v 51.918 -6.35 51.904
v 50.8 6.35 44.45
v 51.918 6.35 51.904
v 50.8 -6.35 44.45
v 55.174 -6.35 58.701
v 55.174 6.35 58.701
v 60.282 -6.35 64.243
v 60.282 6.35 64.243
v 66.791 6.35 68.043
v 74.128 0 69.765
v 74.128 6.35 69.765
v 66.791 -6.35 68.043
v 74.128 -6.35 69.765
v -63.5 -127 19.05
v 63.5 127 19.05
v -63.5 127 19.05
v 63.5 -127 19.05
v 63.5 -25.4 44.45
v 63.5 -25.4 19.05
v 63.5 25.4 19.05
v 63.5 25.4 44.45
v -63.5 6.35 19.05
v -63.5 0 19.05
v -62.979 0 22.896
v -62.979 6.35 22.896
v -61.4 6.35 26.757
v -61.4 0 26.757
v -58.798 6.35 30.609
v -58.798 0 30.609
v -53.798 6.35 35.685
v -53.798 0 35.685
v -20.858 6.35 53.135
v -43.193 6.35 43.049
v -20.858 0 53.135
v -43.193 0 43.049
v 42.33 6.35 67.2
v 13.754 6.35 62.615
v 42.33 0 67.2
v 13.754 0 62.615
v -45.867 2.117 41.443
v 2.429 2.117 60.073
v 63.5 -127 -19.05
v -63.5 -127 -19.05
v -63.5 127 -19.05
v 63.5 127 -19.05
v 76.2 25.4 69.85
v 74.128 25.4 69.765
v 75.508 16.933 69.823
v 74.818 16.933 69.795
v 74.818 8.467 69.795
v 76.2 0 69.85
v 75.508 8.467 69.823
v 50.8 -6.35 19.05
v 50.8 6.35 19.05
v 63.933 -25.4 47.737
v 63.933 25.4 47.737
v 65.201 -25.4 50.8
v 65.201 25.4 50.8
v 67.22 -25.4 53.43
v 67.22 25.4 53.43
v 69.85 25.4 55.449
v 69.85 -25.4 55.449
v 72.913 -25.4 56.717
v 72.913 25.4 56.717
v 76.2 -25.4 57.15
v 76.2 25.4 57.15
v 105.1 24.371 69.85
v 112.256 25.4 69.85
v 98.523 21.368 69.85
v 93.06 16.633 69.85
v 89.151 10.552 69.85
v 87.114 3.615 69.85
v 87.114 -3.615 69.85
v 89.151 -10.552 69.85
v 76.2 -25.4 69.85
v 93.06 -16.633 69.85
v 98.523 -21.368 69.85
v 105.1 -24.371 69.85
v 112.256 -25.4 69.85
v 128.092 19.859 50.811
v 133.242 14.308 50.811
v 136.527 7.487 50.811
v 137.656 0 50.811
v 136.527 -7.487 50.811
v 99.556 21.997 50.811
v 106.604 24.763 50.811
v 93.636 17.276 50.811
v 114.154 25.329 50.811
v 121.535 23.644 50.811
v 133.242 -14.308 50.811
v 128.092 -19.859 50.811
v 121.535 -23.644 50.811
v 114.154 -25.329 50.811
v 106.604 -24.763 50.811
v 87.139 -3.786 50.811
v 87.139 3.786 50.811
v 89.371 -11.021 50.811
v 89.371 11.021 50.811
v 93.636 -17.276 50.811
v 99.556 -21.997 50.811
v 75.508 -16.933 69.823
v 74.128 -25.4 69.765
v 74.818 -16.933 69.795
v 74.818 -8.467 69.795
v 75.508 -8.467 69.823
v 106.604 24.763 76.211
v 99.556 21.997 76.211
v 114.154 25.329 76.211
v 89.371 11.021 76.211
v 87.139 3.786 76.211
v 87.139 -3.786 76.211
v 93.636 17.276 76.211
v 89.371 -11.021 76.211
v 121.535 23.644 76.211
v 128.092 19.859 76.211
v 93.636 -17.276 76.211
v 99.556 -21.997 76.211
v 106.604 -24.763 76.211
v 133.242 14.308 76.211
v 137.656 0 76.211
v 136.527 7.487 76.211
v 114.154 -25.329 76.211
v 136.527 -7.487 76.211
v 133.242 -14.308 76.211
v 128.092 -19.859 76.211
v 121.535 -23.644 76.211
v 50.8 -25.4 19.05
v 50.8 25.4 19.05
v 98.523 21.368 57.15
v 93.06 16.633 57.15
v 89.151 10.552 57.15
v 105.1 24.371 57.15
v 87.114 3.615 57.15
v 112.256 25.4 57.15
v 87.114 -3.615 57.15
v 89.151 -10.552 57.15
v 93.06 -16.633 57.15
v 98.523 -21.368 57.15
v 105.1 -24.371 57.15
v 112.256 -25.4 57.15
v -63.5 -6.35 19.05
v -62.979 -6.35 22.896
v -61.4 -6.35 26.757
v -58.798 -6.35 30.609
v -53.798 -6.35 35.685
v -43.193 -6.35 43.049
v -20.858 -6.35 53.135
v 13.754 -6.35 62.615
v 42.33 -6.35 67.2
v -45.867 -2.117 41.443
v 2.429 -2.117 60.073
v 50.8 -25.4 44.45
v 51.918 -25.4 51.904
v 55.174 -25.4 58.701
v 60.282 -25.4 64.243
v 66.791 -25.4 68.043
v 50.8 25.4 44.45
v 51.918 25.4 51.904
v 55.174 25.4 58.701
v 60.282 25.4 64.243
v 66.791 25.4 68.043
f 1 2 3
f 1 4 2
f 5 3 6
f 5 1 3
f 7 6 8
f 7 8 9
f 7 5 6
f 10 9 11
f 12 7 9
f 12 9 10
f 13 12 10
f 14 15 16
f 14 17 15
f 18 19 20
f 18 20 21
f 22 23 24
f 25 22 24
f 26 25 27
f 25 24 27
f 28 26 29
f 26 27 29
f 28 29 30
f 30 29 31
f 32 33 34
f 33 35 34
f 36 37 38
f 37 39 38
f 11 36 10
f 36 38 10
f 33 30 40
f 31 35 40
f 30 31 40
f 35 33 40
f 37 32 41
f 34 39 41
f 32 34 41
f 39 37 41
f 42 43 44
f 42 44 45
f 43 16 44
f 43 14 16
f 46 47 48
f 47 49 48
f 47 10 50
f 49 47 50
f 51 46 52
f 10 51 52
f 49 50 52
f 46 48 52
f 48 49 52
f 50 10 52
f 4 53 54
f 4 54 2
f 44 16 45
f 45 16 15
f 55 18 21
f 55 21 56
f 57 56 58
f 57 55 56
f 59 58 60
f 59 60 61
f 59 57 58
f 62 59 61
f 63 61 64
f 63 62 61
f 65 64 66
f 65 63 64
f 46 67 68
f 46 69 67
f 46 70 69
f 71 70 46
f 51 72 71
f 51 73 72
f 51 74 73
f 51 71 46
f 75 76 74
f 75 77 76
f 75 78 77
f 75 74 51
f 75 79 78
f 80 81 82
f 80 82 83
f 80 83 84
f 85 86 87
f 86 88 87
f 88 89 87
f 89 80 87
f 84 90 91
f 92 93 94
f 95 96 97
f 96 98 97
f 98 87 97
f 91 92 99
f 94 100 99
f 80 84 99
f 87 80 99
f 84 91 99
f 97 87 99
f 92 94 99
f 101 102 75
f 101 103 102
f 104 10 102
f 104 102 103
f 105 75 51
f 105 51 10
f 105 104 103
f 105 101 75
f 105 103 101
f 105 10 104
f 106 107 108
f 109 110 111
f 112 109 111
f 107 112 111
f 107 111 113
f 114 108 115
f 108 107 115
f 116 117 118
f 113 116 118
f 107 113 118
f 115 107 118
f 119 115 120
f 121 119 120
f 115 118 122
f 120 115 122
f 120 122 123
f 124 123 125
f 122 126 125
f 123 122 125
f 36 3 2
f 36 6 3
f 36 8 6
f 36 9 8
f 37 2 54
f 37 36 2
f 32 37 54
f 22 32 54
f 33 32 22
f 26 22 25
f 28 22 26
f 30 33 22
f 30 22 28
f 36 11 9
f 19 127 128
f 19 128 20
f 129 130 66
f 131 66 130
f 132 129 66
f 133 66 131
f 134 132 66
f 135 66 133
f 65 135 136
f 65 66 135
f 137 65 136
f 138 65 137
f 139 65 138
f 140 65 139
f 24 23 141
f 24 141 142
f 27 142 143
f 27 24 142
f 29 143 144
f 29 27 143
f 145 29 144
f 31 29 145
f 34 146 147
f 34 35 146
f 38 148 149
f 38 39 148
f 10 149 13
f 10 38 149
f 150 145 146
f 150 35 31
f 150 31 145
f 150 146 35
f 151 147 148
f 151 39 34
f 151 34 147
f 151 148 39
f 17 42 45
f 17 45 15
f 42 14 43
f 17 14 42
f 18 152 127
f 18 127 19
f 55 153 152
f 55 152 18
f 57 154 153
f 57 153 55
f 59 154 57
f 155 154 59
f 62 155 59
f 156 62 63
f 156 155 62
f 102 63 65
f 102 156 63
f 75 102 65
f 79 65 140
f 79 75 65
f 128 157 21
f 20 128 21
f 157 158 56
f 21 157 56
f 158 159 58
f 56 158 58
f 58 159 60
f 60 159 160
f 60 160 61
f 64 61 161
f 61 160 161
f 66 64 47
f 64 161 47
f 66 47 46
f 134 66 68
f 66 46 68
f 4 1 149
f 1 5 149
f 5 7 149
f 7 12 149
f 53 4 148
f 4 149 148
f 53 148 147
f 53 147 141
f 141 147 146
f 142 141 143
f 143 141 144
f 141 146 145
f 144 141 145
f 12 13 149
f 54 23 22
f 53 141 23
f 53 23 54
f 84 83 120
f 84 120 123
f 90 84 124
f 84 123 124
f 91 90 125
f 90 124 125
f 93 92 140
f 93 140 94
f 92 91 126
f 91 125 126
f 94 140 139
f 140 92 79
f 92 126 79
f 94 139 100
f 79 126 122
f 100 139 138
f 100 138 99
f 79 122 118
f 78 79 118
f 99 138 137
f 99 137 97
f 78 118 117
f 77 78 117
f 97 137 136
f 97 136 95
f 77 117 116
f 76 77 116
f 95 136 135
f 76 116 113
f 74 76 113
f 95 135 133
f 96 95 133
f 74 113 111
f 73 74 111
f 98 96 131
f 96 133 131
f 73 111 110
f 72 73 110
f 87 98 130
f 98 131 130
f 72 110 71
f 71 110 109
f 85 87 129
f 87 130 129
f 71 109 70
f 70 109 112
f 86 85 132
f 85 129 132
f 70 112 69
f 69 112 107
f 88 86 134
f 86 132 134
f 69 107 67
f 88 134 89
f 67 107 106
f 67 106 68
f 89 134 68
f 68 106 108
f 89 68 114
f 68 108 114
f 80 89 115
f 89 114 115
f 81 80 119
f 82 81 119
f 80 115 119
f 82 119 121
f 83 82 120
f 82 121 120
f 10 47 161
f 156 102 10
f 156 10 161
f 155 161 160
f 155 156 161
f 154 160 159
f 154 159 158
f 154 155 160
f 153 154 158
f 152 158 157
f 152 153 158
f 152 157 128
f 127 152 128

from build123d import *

# Parameters (mm, degrees)
F1_DEPTH = 127
F0_W     = 25.4
F0_H     = 12.7
F2_DEPTH = 25.4
F3_DEPTH = 6.35


with BuildPart() as f1:
    # F0 (on Front) → F1 (new body, symmetric)
    with BuildSketch(Plane.XZ):
        Polygon((50.8, 19.05), (-63.5, 19.05), (-63.5, -19.05), (63.5, -19.05), (63.5, 19.05), align=None)
    extrude(amount=F1_DEPTH, both=True)


with BuildPart() as f2:
    # F0 (on Front) → F2 (new body, symmetric)
    with BuildSketch(Plane.XZ):
        with BuildLine():
            Line((50.8, 44.45), (50.8, 19.05))
            Line((50.8, 19.05), (63.5, 19.05))
            Line((63.5, 19.05), (63.5, 44.45))
            ThreePointArc((63.5, 44.45), (67.219744, 53.430256), (76.2, 57.15))
            Line((76.2, 57.15), (86.855575, 57.15))
            Line((86.855575, 57.15), (86.855575, 69.85))
            Line((86.855575, 69.85), (76.2, 69.85))
            add(Edge.make_bspline(
                [(74.128456, 69.765385), (74.817225, 69.795126), (75.507747, 69.823336), (76.2, 69.85)],
                knots=[147.396049, 147.396049, 147.396049, 147.396049, 148.649689, 148.649689, 148.649689, 148.649689], degree=3))
            ThreePointArc((74.128456, 69.765385), (57.52144, 61.662536), (50.8, 44.45))
        make_face()
        with Locations((99.555575, 63.5)):
            Rectangle(F0_W, F0_H)
    extrude(amount=F2_DEPTH, both=True)

    # F0 (on Front) → F4 (revolve)
    with BuildSketch(Plane.XZ):
        Polygon((112.255575, 76.210847), (112.255575, 69.85), (112.255575, 57.15), (112.255575, 50.810847), (137.655575, 50.810847), (137.655575, 76.210847), align=None)
    revolve(axis=Axis((112.255575, 0, 63.510847), (0, 0, -1)))


with BuildPart() as f3:
    # F0 (on Front) → F3 (new body, symmetric)
    with BuildSketch(Plane.XZ):
        with BuildLine():
            add(Edge.make_bspline(
                [(-63.5, 19.05), (-63.618937, 41.597746), (-6.853264, 66.268535), (74.128456, 69.765385)],
                knots=[0, 0, 0, 0, 147.396049, 147.396049, 147.396049, 147.396049], degree=3))
            Line((-63.5, 19.05), (50.8, 19.05))
            Line((50.8, 19.05), (50.8, 44.45))
            ThreePointArc((50.8, 44.45), (57.52144, 61.662536), (74.128456, 69.765385))
        make_face()
    extrude(amount=F3_DEPTH, both=True)


solid = Compound([f1.part, f2.part, f3.part])
